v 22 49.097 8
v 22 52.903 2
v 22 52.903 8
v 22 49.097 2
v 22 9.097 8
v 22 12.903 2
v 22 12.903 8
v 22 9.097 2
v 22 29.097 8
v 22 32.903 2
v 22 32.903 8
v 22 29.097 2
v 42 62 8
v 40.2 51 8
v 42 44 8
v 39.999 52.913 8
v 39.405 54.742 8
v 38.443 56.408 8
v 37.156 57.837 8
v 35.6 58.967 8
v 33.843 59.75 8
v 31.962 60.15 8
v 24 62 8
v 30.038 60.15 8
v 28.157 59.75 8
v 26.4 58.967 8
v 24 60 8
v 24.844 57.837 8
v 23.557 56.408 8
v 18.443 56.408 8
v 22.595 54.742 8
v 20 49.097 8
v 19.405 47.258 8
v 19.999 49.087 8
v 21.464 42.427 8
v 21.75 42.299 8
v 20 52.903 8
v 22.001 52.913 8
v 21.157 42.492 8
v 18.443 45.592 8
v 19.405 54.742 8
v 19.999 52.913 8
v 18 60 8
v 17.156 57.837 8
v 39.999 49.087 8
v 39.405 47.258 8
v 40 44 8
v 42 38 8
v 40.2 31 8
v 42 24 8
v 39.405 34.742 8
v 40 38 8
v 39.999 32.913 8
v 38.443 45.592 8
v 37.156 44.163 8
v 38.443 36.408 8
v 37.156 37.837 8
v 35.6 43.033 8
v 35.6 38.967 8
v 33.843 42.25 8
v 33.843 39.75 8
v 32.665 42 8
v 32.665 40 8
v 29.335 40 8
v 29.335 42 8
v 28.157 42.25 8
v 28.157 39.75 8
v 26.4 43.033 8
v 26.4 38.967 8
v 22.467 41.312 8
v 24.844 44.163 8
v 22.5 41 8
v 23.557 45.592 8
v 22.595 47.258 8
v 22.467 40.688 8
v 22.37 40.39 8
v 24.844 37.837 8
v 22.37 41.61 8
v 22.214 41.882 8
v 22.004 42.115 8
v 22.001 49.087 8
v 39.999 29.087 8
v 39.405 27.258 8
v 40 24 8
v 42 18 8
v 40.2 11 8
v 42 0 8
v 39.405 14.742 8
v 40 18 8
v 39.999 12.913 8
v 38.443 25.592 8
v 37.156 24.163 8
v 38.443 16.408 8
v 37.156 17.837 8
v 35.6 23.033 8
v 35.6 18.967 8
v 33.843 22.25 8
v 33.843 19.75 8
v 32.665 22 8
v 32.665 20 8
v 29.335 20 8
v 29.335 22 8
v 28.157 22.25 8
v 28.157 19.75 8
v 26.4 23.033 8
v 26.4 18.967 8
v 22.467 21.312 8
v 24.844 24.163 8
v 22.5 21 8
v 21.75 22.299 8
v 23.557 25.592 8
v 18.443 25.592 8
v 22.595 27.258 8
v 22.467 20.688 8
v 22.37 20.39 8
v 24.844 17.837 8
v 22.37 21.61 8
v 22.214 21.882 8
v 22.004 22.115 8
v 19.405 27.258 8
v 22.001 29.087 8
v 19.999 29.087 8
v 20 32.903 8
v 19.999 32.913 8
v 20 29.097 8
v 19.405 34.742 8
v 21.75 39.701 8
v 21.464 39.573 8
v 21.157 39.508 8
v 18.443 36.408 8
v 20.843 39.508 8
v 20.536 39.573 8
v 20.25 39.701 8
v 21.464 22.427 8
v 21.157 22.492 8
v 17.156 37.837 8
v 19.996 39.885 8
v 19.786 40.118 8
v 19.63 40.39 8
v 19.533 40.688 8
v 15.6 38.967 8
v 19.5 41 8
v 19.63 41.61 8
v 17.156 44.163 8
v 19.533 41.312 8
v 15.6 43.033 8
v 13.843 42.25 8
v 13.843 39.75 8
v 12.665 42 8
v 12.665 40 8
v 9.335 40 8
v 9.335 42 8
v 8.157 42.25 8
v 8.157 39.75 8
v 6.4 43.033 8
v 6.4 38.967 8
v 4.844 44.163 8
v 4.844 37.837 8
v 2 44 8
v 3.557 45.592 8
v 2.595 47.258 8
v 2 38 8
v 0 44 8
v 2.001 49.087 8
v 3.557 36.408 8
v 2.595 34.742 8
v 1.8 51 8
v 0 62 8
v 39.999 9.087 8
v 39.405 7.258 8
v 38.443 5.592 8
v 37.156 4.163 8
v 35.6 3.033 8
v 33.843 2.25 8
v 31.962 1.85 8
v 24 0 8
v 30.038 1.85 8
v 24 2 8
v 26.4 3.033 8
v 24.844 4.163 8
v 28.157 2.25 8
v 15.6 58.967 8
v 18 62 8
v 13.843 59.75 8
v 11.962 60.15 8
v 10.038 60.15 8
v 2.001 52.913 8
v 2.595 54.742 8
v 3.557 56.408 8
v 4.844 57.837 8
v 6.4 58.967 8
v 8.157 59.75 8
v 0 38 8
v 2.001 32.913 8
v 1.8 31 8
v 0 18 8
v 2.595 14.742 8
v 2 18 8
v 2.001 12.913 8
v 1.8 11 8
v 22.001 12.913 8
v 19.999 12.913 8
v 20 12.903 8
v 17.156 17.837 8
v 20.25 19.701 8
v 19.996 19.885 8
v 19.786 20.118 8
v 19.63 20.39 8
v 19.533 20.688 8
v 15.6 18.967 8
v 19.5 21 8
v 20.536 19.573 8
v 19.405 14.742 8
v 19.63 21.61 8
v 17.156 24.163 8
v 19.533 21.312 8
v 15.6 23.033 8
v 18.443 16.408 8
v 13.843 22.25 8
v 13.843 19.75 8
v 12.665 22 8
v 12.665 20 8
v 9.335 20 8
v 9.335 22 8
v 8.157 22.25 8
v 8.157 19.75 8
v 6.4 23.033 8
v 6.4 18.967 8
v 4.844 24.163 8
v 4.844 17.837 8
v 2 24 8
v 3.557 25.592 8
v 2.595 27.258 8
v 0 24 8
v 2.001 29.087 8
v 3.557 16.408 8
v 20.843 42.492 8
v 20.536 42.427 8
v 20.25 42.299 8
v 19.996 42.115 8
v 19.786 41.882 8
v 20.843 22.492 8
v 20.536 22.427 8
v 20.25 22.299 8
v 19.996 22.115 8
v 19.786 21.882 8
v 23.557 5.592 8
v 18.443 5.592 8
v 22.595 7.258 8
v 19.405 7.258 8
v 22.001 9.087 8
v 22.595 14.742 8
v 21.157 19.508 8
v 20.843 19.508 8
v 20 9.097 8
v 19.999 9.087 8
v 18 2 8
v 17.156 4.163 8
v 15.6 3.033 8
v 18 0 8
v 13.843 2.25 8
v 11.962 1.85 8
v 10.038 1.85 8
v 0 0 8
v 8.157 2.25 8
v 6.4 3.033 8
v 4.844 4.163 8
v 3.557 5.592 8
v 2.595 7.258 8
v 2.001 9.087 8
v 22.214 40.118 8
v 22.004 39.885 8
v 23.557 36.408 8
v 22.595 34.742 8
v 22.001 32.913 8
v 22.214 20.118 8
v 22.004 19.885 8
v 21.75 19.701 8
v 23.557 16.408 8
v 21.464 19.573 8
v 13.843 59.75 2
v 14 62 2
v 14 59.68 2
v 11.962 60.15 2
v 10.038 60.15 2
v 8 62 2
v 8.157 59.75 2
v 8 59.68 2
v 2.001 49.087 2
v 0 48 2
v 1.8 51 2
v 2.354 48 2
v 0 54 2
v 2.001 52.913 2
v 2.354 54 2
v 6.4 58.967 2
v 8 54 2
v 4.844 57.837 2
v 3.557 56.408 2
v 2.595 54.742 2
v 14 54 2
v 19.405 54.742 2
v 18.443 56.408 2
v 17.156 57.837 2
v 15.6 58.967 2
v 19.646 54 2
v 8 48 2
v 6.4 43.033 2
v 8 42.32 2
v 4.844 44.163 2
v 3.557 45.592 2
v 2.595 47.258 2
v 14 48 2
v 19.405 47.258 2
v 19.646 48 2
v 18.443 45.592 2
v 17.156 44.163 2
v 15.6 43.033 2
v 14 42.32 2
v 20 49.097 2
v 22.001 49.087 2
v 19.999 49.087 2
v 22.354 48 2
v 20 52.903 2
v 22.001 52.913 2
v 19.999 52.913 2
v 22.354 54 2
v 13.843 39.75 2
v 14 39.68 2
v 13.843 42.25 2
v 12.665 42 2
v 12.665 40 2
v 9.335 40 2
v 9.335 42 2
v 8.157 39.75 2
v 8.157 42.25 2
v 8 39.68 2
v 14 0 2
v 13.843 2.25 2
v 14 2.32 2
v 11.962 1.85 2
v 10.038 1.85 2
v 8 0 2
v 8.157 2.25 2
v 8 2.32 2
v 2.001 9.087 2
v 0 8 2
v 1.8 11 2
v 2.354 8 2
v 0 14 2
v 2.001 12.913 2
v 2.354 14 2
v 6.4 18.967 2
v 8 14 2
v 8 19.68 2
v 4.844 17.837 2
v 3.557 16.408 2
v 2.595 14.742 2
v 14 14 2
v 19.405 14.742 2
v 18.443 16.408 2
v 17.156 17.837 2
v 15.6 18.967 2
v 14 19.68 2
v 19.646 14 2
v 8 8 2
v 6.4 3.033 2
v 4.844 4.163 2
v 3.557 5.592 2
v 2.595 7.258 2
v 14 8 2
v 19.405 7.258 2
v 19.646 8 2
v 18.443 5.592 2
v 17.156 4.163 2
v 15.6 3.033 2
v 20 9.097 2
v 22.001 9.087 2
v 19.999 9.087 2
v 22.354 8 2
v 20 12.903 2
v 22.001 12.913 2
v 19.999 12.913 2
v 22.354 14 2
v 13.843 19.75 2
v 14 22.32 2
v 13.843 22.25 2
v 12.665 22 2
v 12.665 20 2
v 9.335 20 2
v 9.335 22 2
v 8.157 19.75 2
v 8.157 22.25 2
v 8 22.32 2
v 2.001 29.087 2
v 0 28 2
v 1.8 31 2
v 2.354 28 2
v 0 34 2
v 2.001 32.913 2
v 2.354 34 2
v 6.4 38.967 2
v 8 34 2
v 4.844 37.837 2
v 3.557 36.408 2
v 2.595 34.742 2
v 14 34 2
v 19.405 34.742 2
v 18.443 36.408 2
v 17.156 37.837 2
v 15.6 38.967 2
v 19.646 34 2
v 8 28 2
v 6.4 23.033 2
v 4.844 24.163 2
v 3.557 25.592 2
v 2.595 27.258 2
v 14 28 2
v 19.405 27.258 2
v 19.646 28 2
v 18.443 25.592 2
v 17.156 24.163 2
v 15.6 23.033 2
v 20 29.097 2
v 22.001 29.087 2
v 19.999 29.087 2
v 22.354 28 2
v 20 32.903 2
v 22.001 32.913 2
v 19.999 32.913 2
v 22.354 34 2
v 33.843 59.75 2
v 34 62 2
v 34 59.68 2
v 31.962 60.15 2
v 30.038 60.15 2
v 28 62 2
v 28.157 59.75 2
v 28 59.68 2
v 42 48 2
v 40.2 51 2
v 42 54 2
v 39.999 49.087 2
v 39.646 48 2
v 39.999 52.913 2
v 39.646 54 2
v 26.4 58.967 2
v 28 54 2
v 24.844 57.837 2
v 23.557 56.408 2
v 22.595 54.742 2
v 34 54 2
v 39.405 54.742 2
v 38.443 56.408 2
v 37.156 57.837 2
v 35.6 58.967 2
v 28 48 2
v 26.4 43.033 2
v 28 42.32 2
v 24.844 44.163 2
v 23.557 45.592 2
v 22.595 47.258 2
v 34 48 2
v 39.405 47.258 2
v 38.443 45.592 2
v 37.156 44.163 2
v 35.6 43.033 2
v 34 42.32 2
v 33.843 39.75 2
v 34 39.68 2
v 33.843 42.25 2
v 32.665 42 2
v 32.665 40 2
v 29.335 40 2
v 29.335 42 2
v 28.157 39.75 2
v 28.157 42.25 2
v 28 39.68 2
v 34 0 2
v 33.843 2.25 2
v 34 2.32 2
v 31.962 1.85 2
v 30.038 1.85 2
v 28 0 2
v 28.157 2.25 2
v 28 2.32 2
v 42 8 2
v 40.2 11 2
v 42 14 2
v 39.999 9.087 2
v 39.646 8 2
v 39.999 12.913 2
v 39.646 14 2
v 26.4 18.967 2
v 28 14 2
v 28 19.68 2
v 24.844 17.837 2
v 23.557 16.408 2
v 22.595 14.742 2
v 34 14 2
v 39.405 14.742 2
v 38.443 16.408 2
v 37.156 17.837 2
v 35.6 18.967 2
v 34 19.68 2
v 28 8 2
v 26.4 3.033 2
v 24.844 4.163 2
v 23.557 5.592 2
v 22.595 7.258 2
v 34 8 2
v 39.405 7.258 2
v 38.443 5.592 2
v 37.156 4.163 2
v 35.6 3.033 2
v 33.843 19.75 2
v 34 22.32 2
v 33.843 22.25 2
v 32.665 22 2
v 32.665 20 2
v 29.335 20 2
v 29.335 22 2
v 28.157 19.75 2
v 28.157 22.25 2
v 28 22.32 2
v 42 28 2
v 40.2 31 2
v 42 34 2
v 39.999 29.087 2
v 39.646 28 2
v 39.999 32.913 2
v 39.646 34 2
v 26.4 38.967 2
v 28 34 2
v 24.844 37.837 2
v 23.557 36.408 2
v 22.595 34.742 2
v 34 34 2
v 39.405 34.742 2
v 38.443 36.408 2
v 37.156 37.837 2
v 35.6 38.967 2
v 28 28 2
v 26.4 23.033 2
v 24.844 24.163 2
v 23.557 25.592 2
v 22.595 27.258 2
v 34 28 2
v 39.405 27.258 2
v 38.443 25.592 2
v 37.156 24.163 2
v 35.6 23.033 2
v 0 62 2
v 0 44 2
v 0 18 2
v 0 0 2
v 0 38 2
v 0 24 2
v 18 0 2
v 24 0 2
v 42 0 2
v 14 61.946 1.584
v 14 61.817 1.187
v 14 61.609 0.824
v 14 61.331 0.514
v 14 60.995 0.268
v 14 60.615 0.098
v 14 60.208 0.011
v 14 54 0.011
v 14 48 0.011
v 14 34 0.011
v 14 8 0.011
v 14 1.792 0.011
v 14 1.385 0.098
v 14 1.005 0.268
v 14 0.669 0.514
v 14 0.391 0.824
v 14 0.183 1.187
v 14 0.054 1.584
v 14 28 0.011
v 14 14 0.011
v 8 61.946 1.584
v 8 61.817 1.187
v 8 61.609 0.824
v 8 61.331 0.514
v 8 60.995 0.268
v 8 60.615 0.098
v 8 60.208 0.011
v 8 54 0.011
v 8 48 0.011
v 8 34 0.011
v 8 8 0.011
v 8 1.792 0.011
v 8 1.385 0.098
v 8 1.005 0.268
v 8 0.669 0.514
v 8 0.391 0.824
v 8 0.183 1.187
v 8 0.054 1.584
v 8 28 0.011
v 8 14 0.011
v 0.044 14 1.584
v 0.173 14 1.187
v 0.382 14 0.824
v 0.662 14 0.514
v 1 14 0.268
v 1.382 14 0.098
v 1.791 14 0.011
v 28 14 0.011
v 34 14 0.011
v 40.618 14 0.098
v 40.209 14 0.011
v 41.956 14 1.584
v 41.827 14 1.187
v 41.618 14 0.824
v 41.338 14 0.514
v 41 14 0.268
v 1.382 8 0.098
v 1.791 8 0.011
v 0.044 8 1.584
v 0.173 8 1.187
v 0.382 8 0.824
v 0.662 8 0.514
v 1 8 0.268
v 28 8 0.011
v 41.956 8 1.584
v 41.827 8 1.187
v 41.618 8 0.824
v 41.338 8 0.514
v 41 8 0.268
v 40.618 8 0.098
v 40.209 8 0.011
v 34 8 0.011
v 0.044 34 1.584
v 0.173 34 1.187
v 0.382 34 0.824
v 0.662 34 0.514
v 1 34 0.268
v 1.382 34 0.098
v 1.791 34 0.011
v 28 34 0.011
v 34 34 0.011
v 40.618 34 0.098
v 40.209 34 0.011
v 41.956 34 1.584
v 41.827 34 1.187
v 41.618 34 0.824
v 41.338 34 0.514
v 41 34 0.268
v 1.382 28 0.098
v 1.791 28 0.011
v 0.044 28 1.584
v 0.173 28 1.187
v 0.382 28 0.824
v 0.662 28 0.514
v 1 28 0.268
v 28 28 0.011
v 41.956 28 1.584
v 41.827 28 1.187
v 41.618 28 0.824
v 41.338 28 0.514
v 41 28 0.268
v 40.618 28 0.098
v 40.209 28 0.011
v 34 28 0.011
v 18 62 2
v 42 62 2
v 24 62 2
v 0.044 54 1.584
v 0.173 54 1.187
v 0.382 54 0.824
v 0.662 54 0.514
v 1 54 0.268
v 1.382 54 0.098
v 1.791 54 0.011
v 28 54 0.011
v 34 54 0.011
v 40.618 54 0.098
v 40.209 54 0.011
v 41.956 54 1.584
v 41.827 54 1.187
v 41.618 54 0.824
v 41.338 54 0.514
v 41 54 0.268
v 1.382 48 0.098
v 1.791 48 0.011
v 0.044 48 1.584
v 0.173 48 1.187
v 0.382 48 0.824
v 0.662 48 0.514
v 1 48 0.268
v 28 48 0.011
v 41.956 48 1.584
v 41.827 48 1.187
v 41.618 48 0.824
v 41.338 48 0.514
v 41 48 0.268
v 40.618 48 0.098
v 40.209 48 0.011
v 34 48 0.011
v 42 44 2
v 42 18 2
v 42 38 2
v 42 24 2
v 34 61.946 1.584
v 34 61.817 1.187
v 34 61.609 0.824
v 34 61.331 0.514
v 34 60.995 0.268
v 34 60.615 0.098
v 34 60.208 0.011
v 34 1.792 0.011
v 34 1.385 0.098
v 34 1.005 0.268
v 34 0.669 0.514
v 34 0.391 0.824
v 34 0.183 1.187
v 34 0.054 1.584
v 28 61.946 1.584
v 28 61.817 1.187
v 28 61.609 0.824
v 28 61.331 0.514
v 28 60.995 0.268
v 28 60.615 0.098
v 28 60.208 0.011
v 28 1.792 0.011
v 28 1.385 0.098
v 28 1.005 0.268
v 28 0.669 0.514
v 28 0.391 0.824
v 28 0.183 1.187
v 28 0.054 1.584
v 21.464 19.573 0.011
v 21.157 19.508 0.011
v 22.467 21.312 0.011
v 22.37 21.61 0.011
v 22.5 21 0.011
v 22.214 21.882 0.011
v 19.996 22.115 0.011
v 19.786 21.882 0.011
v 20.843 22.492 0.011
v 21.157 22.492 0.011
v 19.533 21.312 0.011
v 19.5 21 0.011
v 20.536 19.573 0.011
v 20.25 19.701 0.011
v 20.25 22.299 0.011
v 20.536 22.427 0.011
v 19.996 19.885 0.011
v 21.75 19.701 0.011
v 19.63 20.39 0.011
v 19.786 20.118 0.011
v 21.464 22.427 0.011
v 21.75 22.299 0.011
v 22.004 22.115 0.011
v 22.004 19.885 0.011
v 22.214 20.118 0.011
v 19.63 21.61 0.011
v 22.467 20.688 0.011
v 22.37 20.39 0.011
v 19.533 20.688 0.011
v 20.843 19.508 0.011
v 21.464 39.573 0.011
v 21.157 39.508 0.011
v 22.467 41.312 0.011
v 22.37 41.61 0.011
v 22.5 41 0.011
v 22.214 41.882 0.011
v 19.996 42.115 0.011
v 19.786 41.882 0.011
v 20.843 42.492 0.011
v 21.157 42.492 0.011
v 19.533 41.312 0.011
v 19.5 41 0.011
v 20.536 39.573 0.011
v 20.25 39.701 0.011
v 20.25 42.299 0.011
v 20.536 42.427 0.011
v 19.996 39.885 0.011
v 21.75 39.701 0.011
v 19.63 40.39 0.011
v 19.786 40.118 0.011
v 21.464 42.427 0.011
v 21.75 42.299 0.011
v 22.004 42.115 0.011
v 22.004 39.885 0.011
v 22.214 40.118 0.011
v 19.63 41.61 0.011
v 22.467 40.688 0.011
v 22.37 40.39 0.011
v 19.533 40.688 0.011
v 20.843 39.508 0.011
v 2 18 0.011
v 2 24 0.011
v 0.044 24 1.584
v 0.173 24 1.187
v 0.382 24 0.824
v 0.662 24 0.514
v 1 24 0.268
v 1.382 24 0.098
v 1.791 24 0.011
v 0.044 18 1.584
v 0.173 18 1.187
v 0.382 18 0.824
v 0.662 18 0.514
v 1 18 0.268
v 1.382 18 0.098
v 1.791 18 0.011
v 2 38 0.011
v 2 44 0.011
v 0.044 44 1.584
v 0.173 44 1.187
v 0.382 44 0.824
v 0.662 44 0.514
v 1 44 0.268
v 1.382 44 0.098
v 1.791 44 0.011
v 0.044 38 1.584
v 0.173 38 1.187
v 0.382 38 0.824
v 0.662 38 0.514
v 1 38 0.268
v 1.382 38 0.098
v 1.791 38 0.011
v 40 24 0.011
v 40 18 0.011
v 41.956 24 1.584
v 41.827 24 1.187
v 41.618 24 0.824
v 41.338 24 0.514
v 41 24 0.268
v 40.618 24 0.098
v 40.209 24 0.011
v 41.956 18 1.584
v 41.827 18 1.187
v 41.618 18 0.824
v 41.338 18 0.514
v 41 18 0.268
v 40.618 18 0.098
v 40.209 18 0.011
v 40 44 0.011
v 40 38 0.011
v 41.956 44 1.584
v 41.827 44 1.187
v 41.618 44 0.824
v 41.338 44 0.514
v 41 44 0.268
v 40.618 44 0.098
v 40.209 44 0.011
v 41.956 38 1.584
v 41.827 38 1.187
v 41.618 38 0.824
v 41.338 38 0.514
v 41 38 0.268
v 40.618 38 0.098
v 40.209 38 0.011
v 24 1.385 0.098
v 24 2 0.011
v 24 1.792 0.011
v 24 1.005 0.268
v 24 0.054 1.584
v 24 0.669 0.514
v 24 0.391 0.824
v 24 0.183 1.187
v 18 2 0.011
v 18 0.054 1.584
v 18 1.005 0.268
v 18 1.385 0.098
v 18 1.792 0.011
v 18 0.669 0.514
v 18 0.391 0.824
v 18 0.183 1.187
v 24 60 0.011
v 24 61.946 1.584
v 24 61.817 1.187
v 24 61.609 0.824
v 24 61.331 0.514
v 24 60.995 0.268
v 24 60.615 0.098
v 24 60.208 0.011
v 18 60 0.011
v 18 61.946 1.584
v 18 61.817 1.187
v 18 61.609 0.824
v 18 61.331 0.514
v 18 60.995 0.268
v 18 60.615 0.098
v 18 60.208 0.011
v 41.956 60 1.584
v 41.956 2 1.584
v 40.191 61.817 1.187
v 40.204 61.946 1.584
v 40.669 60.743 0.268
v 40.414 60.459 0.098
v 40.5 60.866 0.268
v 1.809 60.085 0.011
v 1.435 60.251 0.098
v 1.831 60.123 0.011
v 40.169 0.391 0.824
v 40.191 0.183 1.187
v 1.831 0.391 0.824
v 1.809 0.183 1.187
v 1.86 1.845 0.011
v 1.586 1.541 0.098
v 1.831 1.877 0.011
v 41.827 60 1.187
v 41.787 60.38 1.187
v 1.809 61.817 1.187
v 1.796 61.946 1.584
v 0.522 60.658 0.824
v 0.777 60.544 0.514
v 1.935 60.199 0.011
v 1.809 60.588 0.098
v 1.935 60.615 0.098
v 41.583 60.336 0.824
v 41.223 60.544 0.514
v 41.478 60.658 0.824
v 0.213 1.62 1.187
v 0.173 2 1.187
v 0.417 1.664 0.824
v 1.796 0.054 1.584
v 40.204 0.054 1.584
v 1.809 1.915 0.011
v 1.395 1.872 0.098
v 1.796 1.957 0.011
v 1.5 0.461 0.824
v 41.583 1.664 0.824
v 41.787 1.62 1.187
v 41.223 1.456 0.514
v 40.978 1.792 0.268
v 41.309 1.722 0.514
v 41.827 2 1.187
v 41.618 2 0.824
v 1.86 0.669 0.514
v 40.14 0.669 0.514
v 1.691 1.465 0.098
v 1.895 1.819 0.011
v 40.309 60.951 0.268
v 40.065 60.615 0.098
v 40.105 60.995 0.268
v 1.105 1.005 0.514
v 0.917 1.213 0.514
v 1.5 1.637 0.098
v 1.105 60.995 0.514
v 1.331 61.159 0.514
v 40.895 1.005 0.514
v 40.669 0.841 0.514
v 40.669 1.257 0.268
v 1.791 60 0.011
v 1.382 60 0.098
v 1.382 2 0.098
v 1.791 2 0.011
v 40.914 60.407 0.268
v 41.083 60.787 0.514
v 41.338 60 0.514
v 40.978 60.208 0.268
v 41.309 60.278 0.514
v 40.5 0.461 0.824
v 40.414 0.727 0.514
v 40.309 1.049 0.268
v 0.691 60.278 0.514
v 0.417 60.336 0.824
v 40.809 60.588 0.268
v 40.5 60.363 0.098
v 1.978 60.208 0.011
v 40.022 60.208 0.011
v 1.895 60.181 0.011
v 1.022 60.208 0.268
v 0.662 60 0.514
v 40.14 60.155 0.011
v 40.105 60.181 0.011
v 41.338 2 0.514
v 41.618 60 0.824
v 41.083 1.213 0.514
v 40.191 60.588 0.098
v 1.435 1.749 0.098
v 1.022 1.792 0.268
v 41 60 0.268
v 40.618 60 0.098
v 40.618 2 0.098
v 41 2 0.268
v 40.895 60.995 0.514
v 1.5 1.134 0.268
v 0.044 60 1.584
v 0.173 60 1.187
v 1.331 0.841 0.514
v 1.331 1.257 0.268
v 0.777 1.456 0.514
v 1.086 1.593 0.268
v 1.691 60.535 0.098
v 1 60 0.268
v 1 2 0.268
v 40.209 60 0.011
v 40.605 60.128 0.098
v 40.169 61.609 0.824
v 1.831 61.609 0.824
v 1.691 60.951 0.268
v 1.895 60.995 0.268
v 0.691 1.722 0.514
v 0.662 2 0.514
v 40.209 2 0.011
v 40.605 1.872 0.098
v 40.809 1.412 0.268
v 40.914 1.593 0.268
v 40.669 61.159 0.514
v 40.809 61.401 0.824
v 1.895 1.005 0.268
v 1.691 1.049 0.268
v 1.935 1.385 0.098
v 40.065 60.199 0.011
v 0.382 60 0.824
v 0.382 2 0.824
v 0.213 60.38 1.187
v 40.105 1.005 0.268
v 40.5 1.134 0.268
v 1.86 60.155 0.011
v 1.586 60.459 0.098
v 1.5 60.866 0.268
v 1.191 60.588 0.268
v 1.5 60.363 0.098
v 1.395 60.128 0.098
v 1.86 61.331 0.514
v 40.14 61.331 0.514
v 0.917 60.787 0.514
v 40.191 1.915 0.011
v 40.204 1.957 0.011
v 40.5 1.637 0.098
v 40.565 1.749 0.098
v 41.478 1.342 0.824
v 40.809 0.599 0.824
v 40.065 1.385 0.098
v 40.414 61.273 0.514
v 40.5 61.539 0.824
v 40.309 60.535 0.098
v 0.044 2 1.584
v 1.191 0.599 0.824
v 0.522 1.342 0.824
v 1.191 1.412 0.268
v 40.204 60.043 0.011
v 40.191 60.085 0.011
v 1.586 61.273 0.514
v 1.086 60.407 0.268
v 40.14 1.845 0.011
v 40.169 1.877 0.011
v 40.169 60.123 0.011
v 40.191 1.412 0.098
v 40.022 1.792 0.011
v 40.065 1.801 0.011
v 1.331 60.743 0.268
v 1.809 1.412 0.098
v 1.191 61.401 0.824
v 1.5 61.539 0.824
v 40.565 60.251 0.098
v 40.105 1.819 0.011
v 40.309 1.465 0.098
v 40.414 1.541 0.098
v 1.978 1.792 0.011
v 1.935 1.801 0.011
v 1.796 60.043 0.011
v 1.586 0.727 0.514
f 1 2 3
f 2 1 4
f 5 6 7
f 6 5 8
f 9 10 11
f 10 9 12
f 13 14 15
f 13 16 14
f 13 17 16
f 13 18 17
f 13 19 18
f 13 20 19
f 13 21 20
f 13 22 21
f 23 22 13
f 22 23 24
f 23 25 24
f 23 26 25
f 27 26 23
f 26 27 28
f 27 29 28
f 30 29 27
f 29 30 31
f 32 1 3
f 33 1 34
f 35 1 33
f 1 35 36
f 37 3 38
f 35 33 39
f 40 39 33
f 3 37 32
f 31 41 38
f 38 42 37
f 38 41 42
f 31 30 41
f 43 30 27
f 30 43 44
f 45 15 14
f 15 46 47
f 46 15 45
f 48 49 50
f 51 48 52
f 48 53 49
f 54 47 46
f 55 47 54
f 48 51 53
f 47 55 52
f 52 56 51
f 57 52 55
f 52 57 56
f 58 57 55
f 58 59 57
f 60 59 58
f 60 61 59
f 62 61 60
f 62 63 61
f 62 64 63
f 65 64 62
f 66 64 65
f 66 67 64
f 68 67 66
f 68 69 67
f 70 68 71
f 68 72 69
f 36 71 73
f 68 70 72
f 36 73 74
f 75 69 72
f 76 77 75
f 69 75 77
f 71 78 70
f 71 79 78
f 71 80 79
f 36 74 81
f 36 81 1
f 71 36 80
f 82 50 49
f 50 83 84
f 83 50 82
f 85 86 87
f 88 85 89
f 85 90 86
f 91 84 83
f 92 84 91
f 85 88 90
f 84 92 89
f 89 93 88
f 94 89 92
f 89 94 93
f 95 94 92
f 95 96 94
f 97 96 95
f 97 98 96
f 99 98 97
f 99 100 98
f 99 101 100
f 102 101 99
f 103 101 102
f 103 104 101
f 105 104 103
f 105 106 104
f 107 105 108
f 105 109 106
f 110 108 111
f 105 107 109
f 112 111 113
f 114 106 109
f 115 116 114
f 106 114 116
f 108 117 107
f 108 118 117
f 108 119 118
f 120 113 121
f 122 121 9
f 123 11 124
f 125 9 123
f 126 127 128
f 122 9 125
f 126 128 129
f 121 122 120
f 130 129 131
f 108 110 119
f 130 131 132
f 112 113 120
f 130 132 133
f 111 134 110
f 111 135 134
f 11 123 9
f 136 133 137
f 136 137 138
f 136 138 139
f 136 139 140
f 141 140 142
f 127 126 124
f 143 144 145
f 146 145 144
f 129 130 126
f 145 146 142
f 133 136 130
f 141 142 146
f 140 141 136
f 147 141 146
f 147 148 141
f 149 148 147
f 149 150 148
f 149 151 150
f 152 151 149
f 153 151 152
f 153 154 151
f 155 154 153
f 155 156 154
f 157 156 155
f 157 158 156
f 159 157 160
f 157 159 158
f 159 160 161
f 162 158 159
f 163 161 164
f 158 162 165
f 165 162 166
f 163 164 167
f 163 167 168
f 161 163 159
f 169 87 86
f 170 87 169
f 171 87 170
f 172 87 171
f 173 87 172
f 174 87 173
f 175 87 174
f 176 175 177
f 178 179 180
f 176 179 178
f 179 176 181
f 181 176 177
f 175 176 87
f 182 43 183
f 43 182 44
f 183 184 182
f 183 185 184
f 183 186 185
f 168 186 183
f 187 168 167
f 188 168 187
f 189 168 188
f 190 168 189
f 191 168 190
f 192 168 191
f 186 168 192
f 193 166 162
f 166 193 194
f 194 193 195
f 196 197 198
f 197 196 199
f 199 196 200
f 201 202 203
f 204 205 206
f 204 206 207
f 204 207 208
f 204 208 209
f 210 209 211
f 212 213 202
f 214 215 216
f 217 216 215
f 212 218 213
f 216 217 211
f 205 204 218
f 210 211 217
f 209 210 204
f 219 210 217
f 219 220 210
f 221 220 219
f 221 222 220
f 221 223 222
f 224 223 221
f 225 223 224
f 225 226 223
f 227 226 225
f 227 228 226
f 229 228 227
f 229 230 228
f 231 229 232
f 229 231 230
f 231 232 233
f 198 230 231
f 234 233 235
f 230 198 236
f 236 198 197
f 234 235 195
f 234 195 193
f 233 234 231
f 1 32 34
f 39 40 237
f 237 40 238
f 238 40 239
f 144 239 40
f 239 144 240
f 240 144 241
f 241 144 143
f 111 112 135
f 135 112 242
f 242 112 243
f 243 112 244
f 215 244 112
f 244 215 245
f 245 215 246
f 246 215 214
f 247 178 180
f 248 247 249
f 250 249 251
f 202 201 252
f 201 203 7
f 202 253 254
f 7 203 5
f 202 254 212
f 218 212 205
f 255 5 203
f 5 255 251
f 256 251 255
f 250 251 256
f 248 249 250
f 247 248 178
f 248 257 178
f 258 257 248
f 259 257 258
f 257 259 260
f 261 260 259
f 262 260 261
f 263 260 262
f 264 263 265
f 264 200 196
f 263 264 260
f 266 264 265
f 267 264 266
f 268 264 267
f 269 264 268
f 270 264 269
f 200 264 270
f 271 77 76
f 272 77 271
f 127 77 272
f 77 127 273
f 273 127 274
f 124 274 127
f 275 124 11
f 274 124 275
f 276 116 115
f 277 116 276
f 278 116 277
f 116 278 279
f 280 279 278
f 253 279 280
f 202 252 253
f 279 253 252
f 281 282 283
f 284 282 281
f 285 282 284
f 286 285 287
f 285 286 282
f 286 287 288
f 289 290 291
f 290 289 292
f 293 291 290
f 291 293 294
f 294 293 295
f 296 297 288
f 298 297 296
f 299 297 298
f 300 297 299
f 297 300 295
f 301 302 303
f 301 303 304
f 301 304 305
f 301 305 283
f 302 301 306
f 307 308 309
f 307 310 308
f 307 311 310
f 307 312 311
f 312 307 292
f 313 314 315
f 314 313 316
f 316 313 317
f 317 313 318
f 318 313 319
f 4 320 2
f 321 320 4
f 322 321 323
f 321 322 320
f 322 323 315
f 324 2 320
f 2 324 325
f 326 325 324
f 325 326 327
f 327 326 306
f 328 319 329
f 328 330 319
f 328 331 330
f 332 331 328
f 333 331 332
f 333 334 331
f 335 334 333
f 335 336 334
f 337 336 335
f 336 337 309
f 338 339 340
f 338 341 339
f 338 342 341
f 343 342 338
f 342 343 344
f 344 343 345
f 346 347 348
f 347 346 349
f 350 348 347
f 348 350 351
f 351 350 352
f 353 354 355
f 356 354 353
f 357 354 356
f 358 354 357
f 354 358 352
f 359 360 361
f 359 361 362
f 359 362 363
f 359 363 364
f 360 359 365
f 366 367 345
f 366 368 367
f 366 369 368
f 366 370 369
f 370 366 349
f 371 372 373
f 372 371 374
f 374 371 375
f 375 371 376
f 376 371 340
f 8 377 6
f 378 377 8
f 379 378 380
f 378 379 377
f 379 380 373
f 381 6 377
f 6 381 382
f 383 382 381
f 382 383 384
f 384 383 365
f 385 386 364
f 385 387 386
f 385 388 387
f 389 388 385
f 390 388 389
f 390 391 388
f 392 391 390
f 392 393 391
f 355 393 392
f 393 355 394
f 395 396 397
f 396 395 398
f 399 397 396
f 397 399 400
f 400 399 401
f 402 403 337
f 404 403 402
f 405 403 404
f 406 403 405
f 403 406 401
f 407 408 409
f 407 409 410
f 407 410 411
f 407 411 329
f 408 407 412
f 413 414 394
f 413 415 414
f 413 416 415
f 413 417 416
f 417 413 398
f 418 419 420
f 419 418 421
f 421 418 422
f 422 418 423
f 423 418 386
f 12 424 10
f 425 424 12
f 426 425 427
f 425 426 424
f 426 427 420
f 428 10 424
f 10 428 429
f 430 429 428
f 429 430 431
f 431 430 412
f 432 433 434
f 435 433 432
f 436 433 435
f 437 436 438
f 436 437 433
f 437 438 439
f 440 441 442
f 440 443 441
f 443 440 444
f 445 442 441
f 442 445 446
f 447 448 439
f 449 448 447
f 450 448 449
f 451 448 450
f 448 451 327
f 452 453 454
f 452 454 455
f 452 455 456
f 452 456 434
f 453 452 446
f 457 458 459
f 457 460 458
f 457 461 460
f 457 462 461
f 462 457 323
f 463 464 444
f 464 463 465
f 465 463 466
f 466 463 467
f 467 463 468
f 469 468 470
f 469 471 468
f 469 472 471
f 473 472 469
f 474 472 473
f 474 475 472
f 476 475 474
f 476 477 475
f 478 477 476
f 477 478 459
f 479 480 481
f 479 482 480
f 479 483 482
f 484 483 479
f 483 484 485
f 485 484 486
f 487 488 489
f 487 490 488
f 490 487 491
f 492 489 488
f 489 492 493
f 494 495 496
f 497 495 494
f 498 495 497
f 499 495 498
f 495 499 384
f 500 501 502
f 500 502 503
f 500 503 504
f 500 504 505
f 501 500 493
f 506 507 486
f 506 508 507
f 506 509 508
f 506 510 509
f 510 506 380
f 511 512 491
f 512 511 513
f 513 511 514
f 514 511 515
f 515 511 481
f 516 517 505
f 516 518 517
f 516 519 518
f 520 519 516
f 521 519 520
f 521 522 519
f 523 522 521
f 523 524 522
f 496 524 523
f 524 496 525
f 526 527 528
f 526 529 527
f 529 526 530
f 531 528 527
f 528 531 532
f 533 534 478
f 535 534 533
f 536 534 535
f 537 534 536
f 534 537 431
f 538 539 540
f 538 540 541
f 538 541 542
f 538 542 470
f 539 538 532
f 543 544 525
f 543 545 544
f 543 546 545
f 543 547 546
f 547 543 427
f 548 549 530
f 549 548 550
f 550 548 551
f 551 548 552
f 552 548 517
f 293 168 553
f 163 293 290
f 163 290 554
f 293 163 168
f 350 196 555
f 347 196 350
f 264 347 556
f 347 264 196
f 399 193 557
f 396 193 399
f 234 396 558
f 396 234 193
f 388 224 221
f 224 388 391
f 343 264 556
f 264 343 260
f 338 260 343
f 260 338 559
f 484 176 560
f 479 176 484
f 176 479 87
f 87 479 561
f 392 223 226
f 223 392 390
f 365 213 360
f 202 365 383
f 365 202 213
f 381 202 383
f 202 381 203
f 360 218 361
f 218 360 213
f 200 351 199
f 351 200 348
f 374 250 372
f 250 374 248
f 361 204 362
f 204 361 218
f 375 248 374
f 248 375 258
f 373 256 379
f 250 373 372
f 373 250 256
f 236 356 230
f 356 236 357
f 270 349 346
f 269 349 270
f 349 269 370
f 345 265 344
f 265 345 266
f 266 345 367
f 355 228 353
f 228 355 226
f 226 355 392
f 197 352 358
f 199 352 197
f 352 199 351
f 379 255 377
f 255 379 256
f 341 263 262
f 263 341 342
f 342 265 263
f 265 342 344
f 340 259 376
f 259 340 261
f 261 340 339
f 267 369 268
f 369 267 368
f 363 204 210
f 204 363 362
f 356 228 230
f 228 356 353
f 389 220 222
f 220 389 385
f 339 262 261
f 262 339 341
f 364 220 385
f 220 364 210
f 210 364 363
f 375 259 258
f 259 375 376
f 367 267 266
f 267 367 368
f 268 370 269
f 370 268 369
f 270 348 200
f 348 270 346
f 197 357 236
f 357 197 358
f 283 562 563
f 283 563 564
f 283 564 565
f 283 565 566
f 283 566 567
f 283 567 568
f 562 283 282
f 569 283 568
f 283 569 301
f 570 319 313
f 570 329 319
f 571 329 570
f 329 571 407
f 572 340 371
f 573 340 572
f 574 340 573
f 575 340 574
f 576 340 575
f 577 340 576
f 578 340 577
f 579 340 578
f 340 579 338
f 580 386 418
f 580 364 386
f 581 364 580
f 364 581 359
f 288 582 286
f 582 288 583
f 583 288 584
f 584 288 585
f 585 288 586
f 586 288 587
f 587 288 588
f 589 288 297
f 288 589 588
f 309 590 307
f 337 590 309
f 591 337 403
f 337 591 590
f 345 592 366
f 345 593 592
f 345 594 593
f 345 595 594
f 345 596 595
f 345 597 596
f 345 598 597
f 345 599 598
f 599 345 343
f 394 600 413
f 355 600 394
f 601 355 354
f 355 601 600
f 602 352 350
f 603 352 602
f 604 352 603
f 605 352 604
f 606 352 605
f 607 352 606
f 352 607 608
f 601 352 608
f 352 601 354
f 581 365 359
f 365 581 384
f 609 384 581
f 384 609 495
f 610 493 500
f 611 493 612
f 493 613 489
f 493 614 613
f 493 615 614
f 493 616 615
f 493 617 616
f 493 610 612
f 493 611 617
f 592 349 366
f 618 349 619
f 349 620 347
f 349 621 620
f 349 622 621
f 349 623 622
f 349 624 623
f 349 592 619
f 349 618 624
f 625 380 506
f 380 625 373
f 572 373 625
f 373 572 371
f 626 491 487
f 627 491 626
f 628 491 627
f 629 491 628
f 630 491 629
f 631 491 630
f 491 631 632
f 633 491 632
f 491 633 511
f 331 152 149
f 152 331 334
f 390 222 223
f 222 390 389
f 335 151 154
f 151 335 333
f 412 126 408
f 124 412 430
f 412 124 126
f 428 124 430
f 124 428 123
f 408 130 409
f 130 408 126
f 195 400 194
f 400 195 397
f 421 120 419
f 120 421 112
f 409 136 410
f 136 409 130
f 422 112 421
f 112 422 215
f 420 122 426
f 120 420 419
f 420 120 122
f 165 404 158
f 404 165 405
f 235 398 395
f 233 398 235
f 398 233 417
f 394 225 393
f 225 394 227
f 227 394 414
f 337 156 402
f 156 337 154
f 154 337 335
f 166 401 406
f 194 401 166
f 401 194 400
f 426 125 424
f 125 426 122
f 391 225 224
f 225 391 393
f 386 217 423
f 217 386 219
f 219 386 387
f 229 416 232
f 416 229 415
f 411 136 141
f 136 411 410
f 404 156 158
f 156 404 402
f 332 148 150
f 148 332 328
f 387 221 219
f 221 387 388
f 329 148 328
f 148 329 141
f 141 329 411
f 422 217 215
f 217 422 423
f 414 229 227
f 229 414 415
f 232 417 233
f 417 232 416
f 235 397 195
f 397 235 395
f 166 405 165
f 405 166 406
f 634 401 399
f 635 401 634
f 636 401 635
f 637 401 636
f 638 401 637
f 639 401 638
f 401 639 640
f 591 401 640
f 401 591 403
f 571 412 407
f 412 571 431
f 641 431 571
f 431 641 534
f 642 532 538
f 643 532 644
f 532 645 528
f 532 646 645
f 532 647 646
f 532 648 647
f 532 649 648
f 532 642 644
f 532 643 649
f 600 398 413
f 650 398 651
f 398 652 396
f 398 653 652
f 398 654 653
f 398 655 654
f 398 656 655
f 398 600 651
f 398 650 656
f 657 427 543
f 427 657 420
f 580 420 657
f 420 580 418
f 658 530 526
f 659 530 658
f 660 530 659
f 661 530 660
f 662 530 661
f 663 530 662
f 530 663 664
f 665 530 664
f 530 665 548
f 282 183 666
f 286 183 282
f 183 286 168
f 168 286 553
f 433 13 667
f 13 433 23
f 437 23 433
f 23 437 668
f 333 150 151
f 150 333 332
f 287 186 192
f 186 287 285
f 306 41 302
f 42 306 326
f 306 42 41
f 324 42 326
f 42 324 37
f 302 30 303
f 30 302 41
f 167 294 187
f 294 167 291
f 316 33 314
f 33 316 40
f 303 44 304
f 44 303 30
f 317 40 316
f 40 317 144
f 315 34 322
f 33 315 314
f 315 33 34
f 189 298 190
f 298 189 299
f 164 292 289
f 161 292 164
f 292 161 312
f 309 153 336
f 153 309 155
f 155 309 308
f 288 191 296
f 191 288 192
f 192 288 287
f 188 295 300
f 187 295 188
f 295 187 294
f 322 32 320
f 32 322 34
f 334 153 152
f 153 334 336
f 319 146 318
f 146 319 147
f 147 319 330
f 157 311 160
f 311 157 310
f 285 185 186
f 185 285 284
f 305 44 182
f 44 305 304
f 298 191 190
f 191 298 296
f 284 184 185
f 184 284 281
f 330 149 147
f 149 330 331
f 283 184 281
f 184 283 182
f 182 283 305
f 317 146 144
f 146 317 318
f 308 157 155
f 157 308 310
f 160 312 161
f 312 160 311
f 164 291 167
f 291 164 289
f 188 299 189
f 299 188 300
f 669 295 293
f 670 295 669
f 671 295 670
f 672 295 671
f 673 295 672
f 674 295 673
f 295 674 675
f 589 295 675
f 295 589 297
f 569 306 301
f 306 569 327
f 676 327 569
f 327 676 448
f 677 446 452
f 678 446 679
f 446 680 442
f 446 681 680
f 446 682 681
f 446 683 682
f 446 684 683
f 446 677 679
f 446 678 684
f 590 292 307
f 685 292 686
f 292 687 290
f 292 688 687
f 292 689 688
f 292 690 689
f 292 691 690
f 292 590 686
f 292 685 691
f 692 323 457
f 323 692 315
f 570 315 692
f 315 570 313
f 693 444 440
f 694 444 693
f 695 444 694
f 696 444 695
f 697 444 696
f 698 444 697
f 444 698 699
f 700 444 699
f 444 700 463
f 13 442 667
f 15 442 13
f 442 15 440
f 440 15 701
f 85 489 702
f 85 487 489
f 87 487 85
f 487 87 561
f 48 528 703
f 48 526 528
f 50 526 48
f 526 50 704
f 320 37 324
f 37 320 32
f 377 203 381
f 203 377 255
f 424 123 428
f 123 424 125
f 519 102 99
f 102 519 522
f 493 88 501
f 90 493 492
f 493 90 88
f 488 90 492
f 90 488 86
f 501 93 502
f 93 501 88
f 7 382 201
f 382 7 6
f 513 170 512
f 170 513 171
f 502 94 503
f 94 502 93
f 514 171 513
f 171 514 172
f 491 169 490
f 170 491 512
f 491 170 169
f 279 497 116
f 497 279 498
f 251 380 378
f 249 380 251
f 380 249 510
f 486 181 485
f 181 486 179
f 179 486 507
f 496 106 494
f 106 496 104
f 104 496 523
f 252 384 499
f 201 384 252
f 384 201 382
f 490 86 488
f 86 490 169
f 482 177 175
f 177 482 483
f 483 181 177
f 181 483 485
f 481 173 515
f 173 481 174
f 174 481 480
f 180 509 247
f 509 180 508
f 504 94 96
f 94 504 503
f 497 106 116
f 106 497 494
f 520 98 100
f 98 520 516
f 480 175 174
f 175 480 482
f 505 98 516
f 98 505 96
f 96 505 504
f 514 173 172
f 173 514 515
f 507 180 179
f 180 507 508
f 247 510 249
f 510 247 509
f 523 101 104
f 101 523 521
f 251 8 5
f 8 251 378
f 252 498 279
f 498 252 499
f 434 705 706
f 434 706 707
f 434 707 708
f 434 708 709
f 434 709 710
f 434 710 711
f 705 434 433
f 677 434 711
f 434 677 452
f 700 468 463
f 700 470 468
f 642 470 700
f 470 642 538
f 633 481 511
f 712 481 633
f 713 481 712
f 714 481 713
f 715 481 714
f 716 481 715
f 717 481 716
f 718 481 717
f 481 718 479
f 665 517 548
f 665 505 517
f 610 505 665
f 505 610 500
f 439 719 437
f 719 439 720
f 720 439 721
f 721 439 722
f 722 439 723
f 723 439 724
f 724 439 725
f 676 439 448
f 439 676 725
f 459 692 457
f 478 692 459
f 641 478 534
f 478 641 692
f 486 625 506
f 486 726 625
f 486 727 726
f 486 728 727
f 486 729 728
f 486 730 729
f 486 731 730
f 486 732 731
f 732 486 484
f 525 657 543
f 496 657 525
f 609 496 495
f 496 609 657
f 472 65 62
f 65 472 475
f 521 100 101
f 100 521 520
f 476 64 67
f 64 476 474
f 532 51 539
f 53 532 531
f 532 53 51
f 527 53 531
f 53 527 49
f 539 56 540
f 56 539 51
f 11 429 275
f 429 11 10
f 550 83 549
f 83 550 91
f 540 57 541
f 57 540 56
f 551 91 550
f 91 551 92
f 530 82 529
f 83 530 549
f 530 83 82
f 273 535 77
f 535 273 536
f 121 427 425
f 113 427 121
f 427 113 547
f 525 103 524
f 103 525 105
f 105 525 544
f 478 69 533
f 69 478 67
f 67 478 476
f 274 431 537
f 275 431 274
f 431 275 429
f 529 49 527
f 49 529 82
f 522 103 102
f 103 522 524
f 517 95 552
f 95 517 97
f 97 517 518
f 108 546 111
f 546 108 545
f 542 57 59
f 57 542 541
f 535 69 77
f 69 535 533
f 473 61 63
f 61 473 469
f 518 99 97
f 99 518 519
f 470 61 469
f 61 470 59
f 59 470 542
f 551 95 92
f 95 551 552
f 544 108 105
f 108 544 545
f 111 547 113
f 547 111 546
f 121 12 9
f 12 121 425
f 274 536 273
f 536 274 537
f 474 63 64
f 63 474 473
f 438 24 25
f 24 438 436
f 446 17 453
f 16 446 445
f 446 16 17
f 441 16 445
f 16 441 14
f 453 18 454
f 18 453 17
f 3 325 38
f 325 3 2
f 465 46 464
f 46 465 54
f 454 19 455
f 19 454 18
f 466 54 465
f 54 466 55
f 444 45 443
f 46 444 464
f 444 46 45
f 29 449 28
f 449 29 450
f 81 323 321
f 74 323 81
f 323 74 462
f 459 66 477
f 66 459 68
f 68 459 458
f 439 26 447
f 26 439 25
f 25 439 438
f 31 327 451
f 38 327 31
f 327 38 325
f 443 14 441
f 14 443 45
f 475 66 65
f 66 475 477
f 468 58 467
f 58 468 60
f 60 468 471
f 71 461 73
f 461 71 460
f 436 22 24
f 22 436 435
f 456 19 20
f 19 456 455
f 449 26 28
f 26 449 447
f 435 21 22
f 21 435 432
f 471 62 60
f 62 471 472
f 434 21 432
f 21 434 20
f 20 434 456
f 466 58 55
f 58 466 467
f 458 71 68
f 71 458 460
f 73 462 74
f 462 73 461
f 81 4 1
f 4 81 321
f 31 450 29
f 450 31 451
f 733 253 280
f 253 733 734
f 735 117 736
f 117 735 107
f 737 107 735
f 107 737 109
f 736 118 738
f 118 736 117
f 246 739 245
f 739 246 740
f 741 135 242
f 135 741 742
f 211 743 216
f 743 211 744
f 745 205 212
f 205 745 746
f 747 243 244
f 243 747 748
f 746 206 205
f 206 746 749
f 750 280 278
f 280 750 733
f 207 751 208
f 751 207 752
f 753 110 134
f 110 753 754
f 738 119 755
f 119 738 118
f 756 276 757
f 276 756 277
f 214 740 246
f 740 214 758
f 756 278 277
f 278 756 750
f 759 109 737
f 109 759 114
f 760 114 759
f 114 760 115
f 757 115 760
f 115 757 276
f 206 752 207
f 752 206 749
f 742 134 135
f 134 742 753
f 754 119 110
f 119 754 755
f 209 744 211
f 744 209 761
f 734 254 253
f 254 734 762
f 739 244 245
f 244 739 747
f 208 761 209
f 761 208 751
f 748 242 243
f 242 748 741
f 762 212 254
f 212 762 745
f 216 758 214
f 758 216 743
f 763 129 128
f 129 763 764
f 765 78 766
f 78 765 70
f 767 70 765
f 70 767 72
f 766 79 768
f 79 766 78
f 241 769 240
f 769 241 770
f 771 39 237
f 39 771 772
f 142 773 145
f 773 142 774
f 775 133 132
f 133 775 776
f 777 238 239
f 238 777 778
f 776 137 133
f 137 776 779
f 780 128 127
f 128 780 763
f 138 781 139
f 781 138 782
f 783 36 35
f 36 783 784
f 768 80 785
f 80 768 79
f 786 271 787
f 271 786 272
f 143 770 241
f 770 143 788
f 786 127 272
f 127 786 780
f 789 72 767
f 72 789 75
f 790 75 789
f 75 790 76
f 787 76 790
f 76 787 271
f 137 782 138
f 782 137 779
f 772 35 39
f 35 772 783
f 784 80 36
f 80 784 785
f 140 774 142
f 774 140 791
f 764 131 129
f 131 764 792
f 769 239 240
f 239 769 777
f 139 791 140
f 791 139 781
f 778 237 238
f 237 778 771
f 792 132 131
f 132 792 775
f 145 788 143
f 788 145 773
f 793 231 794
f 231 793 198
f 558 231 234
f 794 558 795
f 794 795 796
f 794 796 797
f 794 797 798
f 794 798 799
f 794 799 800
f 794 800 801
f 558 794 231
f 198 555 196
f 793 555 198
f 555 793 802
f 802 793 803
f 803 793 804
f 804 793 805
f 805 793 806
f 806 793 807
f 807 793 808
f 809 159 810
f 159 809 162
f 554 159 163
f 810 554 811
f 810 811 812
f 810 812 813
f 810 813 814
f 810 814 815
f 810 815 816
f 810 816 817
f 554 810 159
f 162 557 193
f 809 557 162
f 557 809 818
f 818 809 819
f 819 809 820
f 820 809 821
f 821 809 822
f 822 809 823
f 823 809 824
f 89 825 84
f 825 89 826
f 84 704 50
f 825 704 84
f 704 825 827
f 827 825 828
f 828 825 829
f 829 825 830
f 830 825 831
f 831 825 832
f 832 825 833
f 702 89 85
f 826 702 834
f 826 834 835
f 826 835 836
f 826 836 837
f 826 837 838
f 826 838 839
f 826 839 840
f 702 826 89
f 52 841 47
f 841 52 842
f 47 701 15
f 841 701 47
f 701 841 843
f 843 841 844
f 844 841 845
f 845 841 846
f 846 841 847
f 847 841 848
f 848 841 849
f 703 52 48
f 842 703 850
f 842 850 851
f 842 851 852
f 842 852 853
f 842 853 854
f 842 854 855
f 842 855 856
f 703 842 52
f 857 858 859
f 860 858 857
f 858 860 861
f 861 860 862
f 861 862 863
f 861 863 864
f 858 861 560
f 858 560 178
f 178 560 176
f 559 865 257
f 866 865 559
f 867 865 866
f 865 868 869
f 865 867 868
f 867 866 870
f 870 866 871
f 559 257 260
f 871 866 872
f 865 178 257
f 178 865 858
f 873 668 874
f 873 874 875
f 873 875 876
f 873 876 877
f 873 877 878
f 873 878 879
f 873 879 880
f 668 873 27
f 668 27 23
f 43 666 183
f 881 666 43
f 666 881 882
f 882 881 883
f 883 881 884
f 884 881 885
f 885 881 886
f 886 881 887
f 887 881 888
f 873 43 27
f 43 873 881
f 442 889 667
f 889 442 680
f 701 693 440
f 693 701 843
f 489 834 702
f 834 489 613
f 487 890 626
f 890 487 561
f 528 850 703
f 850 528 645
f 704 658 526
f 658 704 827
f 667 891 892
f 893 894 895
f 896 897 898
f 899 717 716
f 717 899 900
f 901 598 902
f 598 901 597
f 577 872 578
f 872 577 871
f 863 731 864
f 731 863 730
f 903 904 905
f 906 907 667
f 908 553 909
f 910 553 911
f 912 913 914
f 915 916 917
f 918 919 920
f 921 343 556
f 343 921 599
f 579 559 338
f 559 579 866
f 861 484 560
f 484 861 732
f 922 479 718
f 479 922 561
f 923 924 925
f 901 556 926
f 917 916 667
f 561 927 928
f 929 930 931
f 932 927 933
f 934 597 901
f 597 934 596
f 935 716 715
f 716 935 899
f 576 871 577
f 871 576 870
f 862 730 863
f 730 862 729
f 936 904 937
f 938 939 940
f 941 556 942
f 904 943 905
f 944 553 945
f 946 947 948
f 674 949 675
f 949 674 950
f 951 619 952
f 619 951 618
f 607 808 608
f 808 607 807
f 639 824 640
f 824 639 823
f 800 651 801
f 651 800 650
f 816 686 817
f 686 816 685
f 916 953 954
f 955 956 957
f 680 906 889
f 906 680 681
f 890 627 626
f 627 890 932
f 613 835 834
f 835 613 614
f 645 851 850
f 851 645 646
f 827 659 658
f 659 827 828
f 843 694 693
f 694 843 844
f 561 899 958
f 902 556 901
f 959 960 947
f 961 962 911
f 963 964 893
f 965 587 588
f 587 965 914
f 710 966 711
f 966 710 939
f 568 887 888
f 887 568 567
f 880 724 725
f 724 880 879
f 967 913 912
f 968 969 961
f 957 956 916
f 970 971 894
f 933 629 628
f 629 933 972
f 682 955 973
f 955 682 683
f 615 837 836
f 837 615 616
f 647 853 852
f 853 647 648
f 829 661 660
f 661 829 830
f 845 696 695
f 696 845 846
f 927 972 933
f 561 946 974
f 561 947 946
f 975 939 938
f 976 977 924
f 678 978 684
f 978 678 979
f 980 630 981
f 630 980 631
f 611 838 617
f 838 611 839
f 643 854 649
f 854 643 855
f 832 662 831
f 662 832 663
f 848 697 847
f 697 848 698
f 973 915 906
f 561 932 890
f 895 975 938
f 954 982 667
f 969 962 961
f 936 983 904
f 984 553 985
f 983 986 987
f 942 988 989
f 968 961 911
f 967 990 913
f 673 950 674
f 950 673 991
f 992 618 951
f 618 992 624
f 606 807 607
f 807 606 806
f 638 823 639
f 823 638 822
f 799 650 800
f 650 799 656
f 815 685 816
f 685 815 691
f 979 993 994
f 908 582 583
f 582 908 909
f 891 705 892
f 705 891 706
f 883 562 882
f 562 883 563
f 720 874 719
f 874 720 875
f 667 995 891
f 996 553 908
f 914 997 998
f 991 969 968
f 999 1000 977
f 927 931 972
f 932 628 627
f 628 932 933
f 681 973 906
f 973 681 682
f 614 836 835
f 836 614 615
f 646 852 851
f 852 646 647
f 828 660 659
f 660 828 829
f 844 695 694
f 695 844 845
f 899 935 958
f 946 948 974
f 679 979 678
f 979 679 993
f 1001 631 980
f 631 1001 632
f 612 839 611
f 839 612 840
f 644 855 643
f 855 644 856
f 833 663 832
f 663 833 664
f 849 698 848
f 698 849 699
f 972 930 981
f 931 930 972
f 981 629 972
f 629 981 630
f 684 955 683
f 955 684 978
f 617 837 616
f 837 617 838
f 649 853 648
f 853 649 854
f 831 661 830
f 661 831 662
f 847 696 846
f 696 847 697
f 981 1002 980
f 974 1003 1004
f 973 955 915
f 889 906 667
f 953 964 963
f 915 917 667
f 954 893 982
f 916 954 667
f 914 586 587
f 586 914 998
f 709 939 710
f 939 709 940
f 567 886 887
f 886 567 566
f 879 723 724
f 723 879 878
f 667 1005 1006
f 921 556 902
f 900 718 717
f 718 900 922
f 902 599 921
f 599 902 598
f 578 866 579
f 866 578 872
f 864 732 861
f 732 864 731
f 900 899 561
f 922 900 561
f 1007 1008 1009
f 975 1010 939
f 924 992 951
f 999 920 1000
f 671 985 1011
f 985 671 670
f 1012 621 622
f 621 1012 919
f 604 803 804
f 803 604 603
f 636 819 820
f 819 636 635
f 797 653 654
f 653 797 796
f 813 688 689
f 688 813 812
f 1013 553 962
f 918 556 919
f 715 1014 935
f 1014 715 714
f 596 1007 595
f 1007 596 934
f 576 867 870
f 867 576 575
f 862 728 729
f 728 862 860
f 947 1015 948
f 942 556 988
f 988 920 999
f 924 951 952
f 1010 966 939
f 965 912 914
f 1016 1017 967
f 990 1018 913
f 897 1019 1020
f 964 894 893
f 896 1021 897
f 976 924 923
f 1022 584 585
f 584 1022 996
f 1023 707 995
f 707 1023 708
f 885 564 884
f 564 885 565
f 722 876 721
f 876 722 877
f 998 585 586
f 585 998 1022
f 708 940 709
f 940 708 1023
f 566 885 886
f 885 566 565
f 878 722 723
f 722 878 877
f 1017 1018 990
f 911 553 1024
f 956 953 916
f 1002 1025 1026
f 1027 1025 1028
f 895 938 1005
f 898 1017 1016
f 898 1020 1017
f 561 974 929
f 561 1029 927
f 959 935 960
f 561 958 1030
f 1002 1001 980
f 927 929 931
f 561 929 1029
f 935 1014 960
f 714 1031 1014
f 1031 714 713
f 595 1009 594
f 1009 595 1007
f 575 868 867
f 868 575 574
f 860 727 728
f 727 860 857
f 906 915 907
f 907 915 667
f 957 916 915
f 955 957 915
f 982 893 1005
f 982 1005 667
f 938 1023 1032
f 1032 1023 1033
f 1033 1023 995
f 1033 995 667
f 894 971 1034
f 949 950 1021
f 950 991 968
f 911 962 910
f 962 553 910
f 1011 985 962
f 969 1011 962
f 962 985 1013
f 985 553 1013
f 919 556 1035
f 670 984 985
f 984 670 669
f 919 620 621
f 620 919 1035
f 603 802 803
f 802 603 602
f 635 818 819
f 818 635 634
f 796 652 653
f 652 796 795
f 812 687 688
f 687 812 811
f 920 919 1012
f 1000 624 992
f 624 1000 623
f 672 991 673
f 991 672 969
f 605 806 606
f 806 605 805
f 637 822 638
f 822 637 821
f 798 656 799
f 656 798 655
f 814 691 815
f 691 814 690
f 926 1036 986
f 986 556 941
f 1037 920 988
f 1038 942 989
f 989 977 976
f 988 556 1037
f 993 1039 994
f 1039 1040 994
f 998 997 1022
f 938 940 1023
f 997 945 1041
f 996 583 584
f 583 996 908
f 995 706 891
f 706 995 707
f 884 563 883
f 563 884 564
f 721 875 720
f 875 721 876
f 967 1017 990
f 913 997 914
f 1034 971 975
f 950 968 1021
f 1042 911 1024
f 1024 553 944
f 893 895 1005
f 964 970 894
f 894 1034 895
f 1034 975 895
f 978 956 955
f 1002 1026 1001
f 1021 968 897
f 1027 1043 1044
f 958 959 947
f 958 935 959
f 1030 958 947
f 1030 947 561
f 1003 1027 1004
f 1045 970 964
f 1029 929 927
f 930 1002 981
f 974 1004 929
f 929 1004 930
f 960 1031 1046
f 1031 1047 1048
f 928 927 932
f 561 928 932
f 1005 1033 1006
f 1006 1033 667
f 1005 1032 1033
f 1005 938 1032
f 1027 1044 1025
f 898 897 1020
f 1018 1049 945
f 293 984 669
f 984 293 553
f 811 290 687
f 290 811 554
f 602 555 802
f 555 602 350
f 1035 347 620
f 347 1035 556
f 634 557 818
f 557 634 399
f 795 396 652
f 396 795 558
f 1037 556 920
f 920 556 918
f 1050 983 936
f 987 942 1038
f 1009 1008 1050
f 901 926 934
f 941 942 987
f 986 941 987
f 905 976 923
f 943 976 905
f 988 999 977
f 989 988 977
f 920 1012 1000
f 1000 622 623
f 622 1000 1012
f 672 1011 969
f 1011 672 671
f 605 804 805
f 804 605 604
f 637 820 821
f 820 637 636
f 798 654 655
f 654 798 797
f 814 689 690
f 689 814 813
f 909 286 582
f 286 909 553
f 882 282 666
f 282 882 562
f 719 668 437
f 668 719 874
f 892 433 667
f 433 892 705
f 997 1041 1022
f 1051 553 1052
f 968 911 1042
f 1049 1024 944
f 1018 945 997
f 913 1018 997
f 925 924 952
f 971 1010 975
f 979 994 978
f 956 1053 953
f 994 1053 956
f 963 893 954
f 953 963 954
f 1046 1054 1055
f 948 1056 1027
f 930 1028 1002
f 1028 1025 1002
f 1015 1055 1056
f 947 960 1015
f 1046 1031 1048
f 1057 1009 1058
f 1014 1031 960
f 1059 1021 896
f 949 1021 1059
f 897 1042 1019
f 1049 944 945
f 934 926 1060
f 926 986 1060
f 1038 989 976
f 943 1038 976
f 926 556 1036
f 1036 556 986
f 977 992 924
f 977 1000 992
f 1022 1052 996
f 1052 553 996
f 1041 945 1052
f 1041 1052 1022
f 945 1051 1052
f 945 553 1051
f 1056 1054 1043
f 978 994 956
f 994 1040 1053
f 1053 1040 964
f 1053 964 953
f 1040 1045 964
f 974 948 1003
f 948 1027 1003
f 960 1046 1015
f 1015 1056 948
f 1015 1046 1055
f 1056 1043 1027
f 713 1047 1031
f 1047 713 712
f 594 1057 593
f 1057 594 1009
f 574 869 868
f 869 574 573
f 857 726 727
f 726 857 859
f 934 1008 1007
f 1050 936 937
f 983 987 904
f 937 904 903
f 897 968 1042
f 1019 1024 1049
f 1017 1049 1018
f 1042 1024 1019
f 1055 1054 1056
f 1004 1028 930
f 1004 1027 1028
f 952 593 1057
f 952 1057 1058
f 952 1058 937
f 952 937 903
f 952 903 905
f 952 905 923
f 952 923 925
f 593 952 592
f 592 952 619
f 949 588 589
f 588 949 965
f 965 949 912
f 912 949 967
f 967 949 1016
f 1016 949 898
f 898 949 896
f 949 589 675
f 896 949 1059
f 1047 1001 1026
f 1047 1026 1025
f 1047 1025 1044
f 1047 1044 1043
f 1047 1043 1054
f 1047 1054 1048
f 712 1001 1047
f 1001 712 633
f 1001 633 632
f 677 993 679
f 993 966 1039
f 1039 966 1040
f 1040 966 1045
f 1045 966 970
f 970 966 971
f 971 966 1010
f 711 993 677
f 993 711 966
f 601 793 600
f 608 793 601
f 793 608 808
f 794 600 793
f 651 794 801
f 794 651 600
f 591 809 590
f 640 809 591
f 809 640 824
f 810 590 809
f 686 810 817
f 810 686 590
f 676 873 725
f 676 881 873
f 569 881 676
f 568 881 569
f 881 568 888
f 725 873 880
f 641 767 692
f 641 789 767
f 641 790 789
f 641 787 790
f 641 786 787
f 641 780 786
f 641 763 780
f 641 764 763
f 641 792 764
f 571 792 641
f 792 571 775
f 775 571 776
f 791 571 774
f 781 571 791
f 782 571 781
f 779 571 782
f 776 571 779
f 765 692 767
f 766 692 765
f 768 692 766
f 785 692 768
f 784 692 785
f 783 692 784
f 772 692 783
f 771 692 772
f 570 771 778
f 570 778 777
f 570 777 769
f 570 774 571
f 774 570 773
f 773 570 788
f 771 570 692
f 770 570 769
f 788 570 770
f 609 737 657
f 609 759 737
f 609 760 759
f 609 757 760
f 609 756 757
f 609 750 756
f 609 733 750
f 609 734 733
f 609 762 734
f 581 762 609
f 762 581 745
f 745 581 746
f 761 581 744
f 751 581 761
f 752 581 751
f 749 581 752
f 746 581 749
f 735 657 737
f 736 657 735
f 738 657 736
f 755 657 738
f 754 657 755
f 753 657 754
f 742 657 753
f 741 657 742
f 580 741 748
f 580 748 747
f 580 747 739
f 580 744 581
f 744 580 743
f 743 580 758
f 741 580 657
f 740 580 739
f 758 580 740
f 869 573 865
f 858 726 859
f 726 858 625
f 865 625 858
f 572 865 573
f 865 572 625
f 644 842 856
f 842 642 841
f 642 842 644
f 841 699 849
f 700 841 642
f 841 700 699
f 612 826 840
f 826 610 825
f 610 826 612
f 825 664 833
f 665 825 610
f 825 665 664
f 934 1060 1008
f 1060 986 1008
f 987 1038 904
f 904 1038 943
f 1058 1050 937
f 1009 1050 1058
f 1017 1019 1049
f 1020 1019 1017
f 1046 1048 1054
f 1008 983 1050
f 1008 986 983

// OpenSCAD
// version 1.1

rows = 2;
columns = 3;

// height in mm
height = 8;

// gap width for the nickel strips
gap = 6;
// height of the lip holding the battery in place
lipHeight = 2;
// diameter of the battery
batteryDiameter = 18;

addHoles = 1; // [1:true, 0:false]
holeDiameter = 3;

// adds gaps between the holes on the side of the holder, usefull for tie wraps.
addSideGaps = 1; // [1:true, 0:false]
sideGapWidth = 6;
sideGapDepth = 2;

// the overlap amount used for defining the distance between the cells
overlap = 2;

// make the outer borders rounded?
roundCorners = 1; // [1:true, 0:false]
cornerRadius = 2;

$fn = 30;

function width () = batteryDiameter + 4;
function offset(i) = (width()-overlap) * i;

intersection() {
    difference() {
        for(row = [0 : rows-1]) {
            for(column = [0 : columns-1]) {
                union() {
                    difference() {
                        translate([offset(row), offset(column), lipHeight])
                            cube([width(), width(), height-lipHeight]);
                        translate([offset(row)+width()/2, offset(column)+width()/2, lipHeight])
                            cylinder(h = height-lipHeight, r = (batteryDiameter+0.4)/2);
                    }
                    difference() {
                        translate([offset(row), offset(column), 0])
                            cube([width(), width(), lipHeight]);
                        
                        translate([offset(row) + ((width()-gap)/lipHeight), offset(column), 0])
                            cube([gap, width(), lipHeight]);
                        translate([offset(row), offset(column) + ((width()-gap)/lipHeight), 0])
                            cube([width(), gap, lipHeight]);
                    }
                }
            }
        }
        
        if(addHoles && holeDiameter > 0) {
            for(row = [1 : rows-1]) { // start from second column and row, no holes at the edges
                for(column = [1 : columns-1]) {
                    translate([offset(row)+overlap/2, offset(column)+overlap/2, 0])
                        cylinder(h = height, r = holeDiameter/2);
                }
            }
        }
        
        if(addSideGaps) {
            if(columns > 1) {
                for(column = [1 : columns-1]) {
                    translate([offset(0)-sideGapDepth, offset(column)-sideGapWidth/2+overlap/2, 0])
                        cube([sideGapDepth*2, sideGapWidth, height]);
                }
                
                for(column = [1 : columns-1]) {
                    translate([offset(rows)+overlap-sideGapDepth, offset(column)-sideGapWidth/2+overlap/2, 0])
                        cube([sideGapDepth*2, sideGapWidth, height]);
                }
            }
            
            if(rows > 1) {
                for(row = [1 : rows-1]) {
                    translate([offset(row)-sideGapWidth/2+overlap/2, offset(0)-sideGapDepth, 0])
                        cube([sideGapWidth, sideGapDepth*2, height]);
                }
                
                for(row = [1 : rows-1]) {
                    translate([offset(row)-sideGapWidth/2+overlap/2, offset(columns)+overlap-sideGapDepth, 0])
                        cube([sideGapWidth, sideGapDepth*2, height]);
                }
            }
        }
    }
    
    // adding the rounded corners
    if(roundCorners) {
        hull() {
            translate([0, 0, cornerRadius])
                cube([offset(rows)+overlap, offset(columns)+overlap, height-cornerRadius]);
            translate([cornerRadius, cornerRadius, cornerRadius])
                sphere(r = cornerRadius);
            translate([offset(rows)+overlap-cornerRadius, cornerRadius, cornerRadius])
                sphere(r = cornerRadius);
            translate([cornerRadius, offset(columns)+overlap-cornerRadius, cornerRadius])
                sphere(r = cornerRadius);
            translate([offset(rows)+overlap-cornerRadius, offset(columns)+overlap-cornerRadius, cornerRadius])
                sphere(r = cornerRadius);
        } 
    }
}
